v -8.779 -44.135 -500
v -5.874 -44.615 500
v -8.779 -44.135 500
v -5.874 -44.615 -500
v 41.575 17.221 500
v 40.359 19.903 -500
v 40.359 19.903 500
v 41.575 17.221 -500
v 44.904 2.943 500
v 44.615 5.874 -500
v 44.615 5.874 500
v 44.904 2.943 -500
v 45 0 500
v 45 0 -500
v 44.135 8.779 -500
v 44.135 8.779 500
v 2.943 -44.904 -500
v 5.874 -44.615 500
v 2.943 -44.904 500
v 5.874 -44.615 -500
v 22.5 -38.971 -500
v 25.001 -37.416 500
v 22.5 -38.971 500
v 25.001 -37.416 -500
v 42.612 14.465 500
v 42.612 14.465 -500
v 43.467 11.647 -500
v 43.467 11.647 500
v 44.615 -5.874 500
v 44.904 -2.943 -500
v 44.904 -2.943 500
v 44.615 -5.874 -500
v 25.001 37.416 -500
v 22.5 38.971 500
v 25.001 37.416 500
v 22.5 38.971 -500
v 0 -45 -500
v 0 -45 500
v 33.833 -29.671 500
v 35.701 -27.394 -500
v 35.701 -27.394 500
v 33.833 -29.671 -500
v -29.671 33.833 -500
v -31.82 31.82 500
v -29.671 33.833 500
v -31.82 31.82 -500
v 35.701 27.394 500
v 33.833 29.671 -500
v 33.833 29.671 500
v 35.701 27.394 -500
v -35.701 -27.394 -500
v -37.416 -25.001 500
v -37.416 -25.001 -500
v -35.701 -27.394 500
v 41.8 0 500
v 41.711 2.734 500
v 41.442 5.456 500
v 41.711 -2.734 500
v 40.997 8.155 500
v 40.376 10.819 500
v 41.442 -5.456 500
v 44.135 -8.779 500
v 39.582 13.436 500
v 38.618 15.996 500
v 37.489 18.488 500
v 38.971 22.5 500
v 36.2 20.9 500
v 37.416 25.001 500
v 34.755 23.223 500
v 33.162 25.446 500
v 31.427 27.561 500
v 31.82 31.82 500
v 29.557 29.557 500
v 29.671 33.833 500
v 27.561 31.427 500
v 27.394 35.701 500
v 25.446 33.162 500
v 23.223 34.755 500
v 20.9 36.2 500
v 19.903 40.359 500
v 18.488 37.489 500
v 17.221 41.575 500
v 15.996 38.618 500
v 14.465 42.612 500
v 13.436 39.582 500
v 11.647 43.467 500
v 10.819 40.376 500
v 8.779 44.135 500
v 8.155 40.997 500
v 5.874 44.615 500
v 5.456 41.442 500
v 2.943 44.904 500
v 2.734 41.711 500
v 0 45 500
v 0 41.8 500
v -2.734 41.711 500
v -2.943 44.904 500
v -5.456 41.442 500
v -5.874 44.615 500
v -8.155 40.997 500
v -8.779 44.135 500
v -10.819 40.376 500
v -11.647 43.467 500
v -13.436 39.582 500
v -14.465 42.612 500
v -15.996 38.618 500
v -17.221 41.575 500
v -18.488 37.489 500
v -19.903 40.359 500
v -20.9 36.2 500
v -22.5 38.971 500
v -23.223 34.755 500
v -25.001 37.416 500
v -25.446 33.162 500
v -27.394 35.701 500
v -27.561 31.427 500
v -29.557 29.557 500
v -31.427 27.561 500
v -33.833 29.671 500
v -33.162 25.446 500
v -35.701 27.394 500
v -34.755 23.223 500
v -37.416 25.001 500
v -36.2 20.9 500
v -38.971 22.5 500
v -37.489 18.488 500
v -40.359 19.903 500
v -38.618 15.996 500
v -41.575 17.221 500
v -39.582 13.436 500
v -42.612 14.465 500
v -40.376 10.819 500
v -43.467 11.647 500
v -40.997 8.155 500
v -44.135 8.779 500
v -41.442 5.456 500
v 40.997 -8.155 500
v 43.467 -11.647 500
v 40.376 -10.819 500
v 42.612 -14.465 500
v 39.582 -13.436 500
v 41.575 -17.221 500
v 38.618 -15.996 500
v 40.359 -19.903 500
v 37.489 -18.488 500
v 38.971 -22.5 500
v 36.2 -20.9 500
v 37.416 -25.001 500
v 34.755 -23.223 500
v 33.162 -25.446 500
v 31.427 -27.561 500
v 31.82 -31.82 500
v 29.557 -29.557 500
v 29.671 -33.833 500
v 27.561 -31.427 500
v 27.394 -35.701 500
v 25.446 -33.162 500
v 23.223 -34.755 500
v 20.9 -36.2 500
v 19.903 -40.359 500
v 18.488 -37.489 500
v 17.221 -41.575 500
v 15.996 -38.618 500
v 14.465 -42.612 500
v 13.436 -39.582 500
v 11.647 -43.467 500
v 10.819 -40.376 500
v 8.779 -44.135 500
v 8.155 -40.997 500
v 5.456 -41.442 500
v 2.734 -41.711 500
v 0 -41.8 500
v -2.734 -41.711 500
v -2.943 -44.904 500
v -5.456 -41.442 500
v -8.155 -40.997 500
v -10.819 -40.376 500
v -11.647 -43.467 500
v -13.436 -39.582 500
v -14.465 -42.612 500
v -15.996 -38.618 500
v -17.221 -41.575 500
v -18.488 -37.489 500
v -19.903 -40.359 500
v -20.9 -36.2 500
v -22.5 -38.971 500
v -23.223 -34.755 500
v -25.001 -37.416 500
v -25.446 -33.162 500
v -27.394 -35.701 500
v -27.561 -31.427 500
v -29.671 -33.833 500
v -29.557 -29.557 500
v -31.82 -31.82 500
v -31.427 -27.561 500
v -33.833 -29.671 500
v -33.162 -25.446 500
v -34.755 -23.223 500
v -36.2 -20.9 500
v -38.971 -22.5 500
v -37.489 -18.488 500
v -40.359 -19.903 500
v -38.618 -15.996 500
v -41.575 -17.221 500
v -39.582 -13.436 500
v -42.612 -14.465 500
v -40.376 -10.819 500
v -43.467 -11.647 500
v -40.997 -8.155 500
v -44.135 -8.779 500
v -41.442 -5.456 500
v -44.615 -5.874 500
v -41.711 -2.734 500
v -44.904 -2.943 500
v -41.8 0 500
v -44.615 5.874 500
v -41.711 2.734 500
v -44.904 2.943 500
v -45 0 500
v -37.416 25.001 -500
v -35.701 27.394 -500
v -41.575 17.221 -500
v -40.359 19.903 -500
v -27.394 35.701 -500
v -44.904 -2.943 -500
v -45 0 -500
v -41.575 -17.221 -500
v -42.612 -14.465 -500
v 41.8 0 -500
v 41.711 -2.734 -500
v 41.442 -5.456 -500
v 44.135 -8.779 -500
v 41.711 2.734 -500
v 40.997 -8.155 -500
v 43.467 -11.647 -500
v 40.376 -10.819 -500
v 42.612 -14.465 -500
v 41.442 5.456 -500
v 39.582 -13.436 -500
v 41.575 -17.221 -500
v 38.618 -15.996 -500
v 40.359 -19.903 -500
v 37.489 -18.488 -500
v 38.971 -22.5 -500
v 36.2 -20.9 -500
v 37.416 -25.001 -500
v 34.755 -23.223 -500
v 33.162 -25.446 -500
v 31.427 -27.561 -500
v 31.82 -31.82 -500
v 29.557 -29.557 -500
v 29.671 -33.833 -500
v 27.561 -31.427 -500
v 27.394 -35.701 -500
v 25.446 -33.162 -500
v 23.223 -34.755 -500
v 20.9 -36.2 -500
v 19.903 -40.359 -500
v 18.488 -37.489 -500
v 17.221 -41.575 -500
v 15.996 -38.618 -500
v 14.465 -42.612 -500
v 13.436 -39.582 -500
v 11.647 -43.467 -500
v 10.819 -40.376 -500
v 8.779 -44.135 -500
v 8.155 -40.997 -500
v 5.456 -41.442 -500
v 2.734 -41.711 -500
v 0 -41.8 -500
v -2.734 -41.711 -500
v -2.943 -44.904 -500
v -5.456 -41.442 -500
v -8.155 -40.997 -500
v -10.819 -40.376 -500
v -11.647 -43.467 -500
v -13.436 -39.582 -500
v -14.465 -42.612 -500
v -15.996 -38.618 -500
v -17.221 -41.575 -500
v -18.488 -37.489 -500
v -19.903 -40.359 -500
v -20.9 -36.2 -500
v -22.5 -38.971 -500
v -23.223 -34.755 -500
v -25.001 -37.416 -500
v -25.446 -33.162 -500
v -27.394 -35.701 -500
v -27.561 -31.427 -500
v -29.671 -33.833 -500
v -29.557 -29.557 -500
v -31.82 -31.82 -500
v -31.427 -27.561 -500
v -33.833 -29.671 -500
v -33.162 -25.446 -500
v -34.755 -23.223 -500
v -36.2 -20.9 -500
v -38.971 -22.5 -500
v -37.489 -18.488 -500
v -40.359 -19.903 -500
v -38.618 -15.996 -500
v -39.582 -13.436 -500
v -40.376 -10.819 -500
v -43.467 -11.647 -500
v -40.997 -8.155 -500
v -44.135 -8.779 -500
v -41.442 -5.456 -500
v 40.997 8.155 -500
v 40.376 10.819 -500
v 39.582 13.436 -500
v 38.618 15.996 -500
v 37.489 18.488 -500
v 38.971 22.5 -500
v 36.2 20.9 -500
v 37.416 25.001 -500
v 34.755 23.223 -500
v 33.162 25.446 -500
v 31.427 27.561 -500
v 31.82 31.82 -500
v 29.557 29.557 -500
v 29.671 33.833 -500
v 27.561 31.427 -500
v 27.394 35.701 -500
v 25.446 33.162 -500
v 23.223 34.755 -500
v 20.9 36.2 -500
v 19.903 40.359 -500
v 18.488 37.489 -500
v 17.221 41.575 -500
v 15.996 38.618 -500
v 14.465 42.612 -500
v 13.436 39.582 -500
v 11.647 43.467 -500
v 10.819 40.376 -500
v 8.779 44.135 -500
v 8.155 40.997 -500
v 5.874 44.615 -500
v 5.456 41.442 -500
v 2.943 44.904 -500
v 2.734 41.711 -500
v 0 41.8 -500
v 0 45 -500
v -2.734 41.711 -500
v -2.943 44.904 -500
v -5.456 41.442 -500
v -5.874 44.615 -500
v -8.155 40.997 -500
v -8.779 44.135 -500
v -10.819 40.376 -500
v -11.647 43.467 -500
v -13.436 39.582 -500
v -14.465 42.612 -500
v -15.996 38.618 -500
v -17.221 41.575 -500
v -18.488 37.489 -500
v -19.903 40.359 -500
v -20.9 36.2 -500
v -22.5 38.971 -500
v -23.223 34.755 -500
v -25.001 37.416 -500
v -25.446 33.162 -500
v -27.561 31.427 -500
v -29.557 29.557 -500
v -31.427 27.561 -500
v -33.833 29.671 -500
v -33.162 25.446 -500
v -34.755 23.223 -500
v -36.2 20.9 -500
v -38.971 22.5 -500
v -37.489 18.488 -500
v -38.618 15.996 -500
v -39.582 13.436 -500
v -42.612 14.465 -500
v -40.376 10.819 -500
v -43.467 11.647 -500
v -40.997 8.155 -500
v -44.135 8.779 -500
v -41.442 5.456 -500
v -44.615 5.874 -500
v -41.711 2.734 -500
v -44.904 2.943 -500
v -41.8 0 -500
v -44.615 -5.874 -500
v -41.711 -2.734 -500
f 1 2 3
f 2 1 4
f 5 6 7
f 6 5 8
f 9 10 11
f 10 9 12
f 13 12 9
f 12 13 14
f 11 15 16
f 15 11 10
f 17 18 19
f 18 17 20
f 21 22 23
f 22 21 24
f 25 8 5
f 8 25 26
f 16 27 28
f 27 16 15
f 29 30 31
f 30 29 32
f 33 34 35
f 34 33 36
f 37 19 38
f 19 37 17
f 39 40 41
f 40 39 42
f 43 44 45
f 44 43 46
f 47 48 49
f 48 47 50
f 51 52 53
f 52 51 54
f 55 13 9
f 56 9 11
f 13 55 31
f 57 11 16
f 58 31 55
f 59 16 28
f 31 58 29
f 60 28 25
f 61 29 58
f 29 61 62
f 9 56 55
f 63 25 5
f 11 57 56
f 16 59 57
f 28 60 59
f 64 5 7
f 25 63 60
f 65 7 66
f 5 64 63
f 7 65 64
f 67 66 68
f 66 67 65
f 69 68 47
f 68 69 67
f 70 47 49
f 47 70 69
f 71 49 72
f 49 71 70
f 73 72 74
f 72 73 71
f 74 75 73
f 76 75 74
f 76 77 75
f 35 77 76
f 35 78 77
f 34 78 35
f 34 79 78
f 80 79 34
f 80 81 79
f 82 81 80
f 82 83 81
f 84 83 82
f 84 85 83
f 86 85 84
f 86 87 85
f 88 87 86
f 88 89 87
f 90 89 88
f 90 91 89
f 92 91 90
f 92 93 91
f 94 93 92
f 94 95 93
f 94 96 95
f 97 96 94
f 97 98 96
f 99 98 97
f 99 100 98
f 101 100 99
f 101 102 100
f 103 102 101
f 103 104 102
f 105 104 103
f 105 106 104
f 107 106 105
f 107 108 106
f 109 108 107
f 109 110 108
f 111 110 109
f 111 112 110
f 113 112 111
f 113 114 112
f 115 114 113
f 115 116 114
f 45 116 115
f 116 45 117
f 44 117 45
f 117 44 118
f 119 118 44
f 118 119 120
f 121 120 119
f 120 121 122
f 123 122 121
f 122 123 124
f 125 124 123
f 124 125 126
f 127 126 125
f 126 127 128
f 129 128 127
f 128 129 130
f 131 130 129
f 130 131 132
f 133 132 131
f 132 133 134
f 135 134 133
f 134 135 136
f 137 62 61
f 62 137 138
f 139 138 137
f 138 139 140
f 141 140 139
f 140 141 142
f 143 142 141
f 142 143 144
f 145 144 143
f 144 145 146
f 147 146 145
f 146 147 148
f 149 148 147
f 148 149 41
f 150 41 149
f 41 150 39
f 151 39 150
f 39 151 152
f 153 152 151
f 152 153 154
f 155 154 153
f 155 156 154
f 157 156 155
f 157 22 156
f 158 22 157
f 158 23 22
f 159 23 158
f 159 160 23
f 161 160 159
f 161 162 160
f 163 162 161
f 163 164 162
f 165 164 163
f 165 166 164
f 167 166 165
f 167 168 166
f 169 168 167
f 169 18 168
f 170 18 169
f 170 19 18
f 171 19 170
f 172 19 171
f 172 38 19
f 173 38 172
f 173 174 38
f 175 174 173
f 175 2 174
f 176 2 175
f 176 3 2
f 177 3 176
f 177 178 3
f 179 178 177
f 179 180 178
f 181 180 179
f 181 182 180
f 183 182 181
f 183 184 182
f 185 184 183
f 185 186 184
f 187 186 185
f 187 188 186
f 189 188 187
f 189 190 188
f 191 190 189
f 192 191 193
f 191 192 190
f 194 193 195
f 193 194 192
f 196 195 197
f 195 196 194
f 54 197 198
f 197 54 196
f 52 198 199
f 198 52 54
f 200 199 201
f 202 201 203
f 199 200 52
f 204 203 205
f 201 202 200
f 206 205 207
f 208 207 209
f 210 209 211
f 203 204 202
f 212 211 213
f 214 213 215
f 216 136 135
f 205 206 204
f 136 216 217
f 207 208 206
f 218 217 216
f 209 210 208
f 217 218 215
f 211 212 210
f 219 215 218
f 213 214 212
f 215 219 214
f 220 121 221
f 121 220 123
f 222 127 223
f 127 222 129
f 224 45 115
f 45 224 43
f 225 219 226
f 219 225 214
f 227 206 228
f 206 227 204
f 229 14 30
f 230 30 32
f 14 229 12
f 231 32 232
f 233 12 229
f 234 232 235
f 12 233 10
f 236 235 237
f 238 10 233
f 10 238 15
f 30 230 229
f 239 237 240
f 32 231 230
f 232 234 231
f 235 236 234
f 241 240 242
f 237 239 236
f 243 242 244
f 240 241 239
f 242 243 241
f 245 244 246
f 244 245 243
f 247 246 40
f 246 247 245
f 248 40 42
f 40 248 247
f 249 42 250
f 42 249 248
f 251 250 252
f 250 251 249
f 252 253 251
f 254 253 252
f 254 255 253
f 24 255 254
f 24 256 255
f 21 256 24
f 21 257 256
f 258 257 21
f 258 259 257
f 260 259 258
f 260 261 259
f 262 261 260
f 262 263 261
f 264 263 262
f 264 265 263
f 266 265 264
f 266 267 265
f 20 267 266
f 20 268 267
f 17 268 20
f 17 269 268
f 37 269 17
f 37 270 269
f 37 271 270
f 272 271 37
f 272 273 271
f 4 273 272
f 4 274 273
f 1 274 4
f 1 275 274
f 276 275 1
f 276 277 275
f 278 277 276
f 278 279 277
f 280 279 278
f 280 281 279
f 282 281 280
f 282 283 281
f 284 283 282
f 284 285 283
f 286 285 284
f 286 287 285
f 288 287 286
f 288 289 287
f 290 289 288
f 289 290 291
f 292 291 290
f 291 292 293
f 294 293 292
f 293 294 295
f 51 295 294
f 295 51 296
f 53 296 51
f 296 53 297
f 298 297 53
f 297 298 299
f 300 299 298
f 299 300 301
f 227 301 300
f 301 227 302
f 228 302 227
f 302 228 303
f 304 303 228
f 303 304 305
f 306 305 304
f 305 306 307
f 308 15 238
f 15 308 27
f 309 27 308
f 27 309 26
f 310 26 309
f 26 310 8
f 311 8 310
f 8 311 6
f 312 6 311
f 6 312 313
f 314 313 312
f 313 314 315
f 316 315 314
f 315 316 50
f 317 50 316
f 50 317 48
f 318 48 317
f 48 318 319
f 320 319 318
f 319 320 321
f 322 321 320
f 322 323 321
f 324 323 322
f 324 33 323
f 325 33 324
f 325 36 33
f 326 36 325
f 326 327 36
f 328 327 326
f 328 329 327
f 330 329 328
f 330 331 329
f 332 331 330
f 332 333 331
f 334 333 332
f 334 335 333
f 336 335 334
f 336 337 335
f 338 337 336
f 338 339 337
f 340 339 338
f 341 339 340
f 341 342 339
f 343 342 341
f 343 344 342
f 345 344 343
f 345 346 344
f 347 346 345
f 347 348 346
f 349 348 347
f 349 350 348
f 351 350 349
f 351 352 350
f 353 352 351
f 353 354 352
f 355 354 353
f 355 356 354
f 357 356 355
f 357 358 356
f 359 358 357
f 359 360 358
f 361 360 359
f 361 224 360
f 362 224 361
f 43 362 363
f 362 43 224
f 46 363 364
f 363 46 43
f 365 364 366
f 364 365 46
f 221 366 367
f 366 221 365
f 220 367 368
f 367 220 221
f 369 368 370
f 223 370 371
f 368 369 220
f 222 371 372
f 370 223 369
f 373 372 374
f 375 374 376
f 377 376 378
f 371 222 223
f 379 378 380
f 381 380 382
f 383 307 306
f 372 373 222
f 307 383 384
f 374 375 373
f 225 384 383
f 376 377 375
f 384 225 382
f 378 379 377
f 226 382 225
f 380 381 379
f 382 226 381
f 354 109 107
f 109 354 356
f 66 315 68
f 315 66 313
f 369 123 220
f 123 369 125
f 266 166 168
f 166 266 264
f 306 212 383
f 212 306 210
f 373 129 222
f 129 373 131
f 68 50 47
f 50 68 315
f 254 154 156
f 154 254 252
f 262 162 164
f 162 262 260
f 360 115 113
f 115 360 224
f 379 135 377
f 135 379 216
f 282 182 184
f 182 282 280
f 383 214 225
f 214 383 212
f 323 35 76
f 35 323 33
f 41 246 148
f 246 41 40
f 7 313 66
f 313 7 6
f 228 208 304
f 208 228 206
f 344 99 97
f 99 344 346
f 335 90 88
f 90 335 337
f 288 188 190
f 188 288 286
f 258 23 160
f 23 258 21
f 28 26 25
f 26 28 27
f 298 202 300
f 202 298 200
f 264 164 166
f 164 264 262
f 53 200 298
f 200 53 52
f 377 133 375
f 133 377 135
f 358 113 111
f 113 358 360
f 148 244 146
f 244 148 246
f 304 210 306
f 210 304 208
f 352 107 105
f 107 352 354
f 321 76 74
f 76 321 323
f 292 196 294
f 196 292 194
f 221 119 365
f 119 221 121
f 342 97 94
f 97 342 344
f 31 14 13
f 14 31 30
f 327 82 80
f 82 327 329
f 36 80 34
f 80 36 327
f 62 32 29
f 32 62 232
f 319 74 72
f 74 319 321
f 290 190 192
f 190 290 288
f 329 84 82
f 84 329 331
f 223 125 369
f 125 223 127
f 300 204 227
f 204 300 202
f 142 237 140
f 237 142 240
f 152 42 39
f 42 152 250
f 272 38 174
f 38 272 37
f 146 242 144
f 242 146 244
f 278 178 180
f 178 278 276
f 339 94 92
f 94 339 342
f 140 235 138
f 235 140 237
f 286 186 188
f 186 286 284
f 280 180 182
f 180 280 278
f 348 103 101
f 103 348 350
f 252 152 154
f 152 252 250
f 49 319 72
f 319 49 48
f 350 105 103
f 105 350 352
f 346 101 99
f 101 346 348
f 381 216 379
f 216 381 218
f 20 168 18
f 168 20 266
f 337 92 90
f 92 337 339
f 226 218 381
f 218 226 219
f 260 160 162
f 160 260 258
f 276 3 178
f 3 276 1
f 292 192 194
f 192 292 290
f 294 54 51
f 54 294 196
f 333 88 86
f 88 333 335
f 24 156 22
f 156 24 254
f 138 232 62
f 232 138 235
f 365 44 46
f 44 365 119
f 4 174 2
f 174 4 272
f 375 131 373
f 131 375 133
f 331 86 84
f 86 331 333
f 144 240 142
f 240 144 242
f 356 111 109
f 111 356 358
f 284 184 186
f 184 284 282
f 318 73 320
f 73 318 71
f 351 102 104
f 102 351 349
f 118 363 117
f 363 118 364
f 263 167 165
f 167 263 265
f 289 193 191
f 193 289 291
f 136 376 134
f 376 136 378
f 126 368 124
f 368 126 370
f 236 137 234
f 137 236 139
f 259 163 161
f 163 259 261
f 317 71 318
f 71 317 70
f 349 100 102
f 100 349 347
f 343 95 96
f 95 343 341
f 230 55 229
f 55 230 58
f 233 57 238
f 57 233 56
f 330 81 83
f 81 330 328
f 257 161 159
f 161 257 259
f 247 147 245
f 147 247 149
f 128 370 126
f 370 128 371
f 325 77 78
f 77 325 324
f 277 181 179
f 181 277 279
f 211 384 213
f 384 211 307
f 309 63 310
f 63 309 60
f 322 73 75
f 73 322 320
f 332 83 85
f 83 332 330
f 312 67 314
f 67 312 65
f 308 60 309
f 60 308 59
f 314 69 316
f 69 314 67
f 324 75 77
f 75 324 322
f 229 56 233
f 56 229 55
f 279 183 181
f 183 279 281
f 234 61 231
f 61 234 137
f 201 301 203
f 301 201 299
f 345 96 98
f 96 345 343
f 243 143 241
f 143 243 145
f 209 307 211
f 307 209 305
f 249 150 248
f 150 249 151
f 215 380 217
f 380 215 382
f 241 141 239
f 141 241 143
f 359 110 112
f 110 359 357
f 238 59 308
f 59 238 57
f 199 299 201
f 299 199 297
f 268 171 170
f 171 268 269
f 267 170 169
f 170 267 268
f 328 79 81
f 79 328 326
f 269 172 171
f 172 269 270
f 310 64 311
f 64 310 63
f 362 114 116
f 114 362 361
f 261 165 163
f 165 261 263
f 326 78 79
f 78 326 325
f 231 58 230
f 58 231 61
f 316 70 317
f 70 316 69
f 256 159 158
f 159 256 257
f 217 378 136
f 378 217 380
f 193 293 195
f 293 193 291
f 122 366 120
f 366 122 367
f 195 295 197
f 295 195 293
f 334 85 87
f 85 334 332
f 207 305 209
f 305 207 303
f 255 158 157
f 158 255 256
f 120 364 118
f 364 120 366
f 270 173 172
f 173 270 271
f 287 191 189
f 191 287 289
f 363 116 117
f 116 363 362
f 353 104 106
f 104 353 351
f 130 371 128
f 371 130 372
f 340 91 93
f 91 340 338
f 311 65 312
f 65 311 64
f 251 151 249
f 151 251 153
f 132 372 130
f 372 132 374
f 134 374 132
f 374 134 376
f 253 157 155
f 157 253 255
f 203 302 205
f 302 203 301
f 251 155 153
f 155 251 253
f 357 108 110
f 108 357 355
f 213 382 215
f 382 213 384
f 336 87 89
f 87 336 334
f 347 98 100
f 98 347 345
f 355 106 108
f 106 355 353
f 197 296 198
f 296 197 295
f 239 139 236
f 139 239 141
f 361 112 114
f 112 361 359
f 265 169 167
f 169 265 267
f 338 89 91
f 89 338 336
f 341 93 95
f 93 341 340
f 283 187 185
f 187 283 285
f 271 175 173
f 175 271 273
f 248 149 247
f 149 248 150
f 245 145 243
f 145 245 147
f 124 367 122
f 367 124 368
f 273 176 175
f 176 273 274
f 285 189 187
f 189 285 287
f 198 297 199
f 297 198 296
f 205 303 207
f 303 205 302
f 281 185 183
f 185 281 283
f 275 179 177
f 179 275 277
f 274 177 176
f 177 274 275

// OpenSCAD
$fn=96;

pipe_length = 1000;
outer_d = 90;
wall = 3.2;
inner_d = outer_d - 2*wall;

module ht_pipe(len, od, id){
    difference(){
        cylinder(h=len, d=od, center=true);
        cylinder(h=len+2, d=id, center=true);
    }
}

ht_pipe(pipe_length, outer_d, inner_d);
